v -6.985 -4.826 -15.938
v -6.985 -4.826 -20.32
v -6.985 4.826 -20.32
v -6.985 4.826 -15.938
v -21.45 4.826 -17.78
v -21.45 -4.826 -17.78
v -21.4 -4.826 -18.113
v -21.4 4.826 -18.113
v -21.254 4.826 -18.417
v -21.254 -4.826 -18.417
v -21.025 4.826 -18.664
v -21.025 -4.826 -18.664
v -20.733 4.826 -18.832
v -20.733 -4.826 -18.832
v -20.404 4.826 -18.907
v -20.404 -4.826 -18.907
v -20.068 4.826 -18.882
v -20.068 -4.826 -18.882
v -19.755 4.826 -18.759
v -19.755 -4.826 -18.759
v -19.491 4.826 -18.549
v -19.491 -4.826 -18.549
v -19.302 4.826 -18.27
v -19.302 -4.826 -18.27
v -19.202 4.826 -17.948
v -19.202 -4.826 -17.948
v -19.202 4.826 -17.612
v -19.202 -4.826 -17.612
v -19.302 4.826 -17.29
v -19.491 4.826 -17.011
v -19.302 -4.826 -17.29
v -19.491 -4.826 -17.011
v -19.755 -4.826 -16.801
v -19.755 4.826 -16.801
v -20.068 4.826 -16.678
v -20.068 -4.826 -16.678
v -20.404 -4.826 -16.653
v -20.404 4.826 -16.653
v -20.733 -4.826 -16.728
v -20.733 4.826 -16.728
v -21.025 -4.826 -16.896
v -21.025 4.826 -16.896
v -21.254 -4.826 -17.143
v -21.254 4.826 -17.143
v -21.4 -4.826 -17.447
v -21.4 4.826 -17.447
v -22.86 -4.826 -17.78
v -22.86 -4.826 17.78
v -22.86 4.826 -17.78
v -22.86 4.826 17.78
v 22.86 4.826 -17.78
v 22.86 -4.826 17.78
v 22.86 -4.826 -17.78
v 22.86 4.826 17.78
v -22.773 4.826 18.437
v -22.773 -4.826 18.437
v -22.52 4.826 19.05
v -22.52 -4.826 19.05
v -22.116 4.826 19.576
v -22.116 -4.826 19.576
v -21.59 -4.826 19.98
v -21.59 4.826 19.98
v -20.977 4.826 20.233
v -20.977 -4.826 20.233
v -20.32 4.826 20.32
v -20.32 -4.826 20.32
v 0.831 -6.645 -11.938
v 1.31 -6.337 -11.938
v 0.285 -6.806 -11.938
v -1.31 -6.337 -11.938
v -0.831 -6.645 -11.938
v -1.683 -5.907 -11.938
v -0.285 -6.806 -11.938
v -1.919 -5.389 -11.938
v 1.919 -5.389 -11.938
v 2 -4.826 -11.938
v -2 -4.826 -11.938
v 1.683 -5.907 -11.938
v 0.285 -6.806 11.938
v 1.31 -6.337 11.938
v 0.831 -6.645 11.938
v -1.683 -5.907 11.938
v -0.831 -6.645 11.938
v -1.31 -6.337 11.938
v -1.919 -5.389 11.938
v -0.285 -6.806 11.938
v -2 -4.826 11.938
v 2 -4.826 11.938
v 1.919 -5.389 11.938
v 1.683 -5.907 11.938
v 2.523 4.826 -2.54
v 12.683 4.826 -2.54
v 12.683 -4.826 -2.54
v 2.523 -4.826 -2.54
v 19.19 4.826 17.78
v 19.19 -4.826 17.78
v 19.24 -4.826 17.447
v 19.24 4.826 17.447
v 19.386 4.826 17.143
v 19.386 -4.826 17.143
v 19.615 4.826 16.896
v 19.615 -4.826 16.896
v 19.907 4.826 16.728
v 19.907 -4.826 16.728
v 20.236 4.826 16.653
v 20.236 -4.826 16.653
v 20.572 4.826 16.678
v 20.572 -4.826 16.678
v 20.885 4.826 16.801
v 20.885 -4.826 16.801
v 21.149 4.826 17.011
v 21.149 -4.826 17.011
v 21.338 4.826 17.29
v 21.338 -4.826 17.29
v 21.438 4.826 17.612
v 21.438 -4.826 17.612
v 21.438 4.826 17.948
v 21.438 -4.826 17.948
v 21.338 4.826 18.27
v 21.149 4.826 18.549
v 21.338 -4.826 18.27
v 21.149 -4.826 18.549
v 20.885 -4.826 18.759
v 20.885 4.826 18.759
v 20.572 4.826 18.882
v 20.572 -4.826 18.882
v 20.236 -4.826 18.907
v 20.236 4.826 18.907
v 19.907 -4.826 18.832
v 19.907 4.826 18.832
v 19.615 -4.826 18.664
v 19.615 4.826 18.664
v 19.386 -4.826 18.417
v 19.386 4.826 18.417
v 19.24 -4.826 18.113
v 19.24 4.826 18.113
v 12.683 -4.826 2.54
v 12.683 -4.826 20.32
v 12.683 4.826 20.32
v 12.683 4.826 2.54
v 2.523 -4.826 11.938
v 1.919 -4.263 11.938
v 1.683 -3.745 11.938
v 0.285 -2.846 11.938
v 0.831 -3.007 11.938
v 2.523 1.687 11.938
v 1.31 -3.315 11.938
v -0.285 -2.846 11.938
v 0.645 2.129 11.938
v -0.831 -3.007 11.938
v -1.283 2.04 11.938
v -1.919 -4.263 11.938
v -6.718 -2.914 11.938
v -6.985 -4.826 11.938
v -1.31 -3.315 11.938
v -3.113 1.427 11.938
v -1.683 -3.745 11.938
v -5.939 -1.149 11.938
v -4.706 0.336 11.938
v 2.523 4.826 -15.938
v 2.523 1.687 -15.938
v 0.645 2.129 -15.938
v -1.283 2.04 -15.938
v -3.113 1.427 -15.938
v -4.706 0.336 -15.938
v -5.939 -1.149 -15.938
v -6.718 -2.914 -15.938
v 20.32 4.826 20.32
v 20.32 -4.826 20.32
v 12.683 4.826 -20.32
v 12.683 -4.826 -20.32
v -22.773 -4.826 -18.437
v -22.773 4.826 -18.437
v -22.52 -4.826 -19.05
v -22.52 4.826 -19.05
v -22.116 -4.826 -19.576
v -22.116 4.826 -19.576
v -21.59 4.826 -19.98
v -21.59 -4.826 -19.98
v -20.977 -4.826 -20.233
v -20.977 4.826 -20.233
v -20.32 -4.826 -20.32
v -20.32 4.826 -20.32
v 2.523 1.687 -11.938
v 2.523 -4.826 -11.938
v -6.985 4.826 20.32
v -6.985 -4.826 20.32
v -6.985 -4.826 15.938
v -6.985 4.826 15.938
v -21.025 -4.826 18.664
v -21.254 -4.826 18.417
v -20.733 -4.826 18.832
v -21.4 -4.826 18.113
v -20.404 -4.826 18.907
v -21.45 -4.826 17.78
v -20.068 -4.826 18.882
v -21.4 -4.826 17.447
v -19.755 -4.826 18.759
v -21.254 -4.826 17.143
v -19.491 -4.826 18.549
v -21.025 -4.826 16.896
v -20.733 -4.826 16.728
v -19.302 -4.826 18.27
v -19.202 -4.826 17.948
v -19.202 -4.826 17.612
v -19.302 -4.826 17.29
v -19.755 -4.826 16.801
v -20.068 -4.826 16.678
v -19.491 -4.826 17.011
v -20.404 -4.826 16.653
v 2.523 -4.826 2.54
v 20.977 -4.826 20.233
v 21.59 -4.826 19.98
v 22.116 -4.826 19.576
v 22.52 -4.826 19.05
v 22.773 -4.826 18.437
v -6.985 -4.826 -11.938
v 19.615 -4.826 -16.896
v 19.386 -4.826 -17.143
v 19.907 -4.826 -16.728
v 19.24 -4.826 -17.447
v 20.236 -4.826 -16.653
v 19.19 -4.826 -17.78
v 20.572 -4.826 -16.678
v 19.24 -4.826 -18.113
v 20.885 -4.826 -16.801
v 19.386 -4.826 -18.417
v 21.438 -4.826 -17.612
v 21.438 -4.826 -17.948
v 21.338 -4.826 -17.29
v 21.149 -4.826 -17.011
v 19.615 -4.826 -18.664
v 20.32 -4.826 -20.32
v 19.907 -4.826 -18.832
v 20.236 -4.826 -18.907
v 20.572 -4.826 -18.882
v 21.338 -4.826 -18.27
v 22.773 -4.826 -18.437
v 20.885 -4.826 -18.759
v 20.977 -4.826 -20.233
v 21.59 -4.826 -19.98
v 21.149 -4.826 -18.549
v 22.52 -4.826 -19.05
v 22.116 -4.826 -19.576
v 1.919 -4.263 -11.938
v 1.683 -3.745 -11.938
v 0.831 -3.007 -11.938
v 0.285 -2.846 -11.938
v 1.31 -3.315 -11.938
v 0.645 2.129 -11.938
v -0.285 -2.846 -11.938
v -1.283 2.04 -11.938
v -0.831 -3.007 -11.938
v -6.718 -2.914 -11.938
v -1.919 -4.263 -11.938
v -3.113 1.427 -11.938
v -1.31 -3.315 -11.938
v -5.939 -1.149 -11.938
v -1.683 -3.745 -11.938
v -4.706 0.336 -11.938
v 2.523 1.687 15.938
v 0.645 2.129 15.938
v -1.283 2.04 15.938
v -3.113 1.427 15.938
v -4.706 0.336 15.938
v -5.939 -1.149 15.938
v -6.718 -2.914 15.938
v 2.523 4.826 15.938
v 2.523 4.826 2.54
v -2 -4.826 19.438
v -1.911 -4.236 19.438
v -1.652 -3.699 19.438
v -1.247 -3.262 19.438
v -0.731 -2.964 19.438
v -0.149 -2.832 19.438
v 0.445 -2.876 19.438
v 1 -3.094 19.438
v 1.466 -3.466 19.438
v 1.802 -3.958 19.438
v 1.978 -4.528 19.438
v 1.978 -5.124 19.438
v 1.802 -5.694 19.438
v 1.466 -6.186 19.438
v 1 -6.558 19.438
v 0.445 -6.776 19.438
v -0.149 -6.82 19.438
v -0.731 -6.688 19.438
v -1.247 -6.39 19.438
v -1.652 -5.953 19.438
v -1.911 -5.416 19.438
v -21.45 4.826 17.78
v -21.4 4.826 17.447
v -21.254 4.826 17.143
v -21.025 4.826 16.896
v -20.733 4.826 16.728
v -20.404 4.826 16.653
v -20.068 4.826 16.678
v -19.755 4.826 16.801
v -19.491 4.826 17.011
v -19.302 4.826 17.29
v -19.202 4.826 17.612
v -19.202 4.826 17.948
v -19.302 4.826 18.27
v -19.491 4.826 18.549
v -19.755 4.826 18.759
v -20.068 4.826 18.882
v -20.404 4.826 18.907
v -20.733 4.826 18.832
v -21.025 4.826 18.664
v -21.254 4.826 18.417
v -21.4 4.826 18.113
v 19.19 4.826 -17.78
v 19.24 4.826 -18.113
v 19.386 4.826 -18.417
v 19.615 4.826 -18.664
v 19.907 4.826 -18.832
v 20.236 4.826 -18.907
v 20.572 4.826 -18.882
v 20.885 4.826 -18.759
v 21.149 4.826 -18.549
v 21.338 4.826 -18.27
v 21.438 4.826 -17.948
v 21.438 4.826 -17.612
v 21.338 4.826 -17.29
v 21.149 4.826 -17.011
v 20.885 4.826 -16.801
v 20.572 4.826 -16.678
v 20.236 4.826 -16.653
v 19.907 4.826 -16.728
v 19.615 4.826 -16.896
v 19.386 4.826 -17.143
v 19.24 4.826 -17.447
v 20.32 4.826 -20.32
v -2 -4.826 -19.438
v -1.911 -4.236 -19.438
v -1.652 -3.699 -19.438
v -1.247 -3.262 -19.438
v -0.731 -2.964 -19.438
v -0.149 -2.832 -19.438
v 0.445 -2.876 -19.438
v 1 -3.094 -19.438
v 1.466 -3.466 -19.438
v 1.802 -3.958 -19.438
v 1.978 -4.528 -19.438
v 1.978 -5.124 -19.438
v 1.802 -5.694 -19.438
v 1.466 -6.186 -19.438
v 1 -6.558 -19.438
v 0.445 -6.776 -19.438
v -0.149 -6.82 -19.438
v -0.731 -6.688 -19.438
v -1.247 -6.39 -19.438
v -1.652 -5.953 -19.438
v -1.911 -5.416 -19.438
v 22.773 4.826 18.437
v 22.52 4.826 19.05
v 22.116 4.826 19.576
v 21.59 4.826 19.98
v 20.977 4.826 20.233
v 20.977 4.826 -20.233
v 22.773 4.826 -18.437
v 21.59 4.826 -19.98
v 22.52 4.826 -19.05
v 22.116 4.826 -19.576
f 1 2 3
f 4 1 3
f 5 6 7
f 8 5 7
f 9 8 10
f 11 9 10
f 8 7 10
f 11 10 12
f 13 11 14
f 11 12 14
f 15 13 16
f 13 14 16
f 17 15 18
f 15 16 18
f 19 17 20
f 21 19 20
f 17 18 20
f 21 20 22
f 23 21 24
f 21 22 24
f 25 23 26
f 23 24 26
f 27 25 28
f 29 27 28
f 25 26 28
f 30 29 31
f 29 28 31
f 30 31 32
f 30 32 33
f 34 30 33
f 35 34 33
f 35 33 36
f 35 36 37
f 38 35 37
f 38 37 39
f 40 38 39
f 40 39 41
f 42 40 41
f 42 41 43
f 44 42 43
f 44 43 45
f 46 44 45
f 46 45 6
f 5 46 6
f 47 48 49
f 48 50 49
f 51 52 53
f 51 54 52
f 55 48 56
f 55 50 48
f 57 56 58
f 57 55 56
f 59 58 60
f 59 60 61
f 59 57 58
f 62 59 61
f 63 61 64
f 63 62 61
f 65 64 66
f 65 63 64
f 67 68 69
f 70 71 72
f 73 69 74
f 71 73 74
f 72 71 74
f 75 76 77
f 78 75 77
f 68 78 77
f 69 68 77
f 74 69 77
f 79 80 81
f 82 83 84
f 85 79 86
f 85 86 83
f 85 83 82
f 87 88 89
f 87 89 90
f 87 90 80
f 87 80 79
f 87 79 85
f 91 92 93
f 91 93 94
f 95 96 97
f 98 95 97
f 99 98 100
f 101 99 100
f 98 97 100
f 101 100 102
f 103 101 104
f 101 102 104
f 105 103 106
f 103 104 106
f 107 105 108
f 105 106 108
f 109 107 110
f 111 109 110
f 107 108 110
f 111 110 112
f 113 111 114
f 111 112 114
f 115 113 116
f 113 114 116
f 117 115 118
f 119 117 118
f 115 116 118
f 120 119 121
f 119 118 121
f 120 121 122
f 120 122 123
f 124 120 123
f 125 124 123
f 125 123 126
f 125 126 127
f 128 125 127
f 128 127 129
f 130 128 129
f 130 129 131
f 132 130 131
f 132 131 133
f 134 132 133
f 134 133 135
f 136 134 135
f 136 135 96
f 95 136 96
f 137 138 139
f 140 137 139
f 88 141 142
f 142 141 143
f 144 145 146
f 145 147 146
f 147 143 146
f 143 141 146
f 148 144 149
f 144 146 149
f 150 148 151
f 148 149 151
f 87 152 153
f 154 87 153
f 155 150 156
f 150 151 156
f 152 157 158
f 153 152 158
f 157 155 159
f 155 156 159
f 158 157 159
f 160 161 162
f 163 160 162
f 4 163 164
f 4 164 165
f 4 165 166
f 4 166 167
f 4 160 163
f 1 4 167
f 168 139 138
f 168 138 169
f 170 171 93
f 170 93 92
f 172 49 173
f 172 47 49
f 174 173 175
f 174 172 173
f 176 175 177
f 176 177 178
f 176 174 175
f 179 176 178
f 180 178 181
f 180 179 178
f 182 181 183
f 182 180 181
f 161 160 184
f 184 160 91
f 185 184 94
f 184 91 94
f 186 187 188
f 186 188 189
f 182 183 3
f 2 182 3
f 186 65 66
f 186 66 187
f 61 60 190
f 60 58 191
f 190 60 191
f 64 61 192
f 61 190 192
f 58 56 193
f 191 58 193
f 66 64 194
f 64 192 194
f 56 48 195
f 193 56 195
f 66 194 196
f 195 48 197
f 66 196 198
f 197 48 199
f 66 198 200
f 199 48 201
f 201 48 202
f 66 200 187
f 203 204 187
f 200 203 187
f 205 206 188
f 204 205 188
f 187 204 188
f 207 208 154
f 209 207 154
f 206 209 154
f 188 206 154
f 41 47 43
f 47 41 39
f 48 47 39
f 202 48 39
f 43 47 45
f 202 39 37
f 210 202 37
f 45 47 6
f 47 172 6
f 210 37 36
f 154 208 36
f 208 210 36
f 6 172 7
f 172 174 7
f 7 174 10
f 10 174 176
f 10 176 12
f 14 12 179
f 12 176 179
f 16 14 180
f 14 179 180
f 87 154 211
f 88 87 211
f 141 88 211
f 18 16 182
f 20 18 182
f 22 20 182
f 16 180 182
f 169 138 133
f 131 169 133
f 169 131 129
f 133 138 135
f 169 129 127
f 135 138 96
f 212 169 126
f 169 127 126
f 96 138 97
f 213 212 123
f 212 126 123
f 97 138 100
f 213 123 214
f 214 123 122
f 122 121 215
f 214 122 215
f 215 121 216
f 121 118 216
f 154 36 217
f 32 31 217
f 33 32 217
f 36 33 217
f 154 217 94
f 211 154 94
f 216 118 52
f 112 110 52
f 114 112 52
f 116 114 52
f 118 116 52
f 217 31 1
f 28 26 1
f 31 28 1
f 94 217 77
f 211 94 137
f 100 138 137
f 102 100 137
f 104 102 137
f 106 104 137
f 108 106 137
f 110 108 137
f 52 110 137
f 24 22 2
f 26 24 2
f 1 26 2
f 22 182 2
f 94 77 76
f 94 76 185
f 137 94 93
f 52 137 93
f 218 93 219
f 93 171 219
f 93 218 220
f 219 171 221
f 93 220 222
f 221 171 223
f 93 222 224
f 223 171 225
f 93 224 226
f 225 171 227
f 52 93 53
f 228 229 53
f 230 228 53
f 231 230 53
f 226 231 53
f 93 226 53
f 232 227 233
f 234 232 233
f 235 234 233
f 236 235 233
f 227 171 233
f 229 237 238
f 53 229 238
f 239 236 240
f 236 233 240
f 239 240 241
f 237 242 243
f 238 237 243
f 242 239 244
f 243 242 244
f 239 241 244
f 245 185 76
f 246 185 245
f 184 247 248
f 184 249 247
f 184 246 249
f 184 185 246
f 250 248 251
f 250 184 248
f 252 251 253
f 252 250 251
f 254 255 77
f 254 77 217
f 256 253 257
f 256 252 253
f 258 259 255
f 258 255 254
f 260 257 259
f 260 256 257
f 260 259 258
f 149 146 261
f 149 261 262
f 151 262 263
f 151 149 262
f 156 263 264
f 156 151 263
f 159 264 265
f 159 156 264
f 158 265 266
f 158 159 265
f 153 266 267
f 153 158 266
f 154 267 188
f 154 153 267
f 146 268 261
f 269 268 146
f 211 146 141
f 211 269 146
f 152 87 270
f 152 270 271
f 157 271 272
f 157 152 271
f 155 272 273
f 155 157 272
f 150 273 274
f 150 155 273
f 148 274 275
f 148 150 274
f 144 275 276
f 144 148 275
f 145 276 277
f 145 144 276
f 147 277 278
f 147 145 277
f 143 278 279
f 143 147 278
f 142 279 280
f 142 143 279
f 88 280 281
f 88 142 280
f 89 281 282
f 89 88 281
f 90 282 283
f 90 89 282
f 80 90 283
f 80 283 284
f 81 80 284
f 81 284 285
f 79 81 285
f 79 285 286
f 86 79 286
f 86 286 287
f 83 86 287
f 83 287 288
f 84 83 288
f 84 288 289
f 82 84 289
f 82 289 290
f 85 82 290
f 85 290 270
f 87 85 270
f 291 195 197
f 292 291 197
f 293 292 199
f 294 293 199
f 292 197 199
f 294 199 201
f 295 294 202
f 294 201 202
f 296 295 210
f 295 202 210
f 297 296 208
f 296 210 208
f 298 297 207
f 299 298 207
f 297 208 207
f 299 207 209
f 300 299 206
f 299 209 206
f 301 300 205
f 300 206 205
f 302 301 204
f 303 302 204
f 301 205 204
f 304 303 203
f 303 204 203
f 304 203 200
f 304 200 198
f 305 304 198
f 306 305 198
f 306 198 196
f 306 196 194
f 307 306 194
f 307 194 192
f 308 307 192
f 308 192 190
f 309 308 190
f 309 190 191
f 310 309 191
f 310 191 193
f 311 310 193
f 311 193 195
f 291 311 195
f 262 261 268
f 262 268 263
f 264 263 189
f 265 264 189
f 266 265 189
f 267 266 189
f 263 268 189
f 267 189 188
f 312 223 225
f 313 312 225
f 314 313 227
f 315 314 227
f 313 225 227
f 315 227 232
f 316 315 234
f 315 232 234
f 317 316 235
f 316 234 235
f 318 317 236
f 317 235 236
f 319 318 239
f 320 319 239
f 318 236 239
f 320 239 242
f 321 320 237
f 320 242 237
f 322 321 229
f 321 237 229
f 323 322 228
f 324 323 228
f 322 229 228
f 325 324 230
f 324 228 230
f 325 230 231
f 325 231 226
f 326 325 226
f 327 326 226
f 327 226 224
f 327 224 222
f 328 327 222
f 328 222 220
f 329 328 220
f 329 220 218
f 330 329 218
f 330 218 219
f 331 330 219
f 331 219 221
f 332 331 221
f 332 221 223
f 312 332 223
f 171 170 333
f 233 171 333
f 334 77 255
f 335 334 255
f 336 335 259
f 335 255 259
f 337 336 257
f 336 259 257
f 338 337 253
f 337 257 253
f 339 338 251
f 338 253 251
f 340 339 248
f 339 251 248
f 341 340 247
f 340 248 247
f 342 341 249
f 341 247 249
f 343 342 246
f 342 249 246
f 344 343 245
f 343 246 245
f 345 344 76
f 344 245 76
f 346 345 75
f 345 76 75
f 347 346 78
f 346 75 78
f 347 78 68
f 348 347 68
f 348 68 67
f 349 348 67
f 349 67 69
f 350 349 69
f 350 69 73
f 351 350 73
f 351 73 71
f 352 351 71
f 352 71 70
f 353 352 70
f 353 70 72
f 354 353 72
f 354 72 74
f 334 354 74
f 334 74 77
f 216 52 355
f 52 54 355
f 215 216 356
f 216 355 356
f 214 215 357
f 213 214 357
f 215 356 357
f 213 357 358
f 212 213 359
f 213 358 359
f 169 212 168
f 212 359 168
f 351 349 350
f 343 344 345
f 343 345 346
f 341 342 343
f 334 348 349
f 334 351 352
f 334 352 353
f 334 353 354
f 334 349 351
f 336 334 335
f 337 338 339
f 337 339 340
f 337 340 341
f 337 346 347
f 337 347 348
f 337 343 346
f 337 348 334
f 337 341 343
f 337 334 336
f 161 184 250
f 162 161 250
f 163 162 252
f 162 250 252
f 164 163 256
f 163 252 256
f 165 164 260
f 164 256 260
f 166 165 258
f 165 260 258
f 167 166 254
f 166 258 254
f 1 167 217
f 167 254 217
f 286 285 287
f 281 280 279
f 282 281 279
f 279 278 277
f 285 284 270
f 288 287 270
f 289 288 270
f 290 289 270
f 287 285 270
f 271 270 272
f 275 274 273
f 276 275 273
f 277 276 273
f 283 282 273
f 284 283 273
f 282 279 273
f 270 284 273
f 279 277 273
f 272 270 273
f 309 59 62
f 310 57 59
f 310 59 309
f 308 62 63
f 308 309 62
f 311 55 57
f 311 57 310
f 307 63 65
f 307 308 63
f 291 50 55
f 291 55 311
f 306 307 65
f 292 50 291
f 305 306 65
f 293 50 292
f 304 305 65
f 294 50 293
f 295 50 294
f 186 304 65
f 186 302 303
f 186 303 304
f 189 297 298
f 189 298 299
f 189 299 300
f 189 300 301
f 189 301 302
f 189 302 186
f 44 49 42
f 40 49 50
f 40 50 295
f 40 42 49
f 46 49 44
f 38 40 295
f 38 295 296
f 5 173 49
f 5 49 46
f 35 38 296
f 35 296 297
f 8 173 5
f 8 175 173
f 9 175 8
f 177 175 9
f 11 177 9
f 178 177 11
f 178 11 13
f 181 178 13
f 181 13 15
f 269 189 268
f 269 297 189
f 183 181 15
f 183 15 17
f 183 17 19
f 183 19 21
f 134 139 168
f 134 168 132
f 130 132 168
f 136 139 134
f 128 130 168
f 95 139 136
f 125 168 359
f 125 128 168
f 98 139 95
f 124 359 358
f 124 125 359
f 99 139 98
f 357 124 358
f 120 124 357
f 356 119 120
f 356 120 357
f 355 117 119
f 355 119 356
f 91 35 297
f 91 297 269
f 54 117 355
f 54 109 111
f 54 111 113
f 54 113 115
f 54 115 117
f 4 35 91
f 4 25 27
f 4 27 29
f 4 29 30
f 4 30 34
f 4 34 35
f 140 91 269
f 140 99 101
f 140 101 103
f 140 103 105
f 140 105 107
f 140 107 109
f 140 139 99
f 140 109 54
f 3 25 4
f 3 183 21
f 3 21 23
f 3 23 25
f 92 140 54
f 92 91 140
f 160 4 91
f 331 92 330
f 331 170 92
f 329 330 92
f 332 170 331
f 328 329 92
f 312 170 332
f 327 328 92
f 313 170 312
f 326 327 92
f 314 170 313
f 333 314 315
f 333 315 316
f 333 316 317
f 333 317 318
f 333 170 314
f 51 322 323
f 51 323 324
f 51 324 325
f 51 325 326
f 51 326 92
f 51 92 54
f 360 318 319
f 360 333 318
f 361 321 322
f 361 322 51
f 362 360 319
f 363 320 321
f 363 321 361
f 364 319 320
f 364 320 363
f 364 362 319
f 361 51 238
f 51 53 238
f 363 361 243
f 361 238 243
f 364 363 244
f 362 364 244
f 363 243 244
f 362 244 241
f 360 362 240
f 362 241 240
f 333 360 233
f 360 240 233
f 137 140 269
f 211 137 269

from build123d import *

# Parameters (mm, degrees)
SKETCH1_W             = 45.72
SKETCH1_H             = 40.64
BODY_DEPTH            = 4.826
CORNER_FILLET_R       = 2.54
F_4_40_TAPPED_HOLE1_D = 2.2606
SKETCH4_W             = 13.97
SKETCH4_H             = 9.652
WHEEL_CUTOUT_DEPTH    = 8.382
SKETCH5_R             = 2
WHEEL_SHAFT_DEPTH     = 7.5
SKETCH9_W             = 10.16
SKETCH9_H             = 9.652
CUT_EXTRUDE2_DEPTH    = 17.78
BOSS_EXTRUDE2_DEPTH   = 4


with BuildPart() as part:
    # Sketch1 → Body (new body, symmetric)
    with BuildSketch(Plane(origin=(0, 0, 0), x_dir=(1, 0, 0), z_dir=(0, 1, 0))):
        Rectangle(SKETCH1_W, SKETCH1_H)
    extrude(amount=BODY_DEPTH, both=True)

    # Corner Fillet
    corner_fillet_edges = [part.edges().sort_by_distance(p)[0] for p in [
        (22.86, 0, 20.32),
        (-22.86, 0, 20.32),
        (-22.86, 0, -20.32),
        (22.86, 0, -20.32),
    ]]
    fillet(corner_fillet_edges, radius=CORNER_FILLET_R)

    # #4-40 Tapped Hole1 (through all)
    with Locations(Plane(origin=(0, 4.826, 0), x_dir=(1, 0, 0), z_dir=(0, 1, 0))):
        with Locations((20.32, 17.78), (-20.32, -17.78), (-20.32, 17.78), (20.32, -17.78)):
            Hole(F_4_40_TAPPED_HOLE1_D / 2)

    # Sketch4 → Wheel Cutout (cut)
    with BuildSketch(Plane(origin=(0, 0, -20.32), x_dir=(-1, 0, 0), z_dir=(0, 0, -1))):
        Rectangle(SKETCH4_W, SKETCH4_H)
    wheel_cutout = extrude(amount=-WHEEL_CUTOUT_DEPTH, mode=Mode.SUBTRACT)

    # Sketch5 → Wheel Shaft (add)
    with BuildSketch(Plane(origin=(0, 0, -11.938), x_dir=(-1, 0, 0), z_dir=(0, 0, -1))):
        with Locations((0, -4.826)):
            Circle(SKETCH5_R)
    wheel_shaft = extrude(amount=WHEEL_SHAFT_DEPTH)

    # Sketch9 → Cut-Extrude2 (cut)
    with BuildSketch(Plane(origin=(0, 0, -20.32), x_dir=(-1, 0, 0), z_dir=(0, 0, -1))):
        with Locations((-7.603288762, 0)):
            Rectangle(SKETCH9_W, SKETCH9_H)
    cut_extrude2 = extrude(amount=-CUT_EXTRUDE2_DEPTH, mode=Mode.SUBTRACT)

    # Sketch10 → Boss-Extrude2 (add)
    with BuildSketch(Plane(origin=(0, 0, -11.938), x_dir=(-1, 0, 0), z_dir=(0, 0, -1))):
        with BuildLine():
            Line((6.985, 4.826), (-2.523288762, 4.826))
            Line((-2.523288762, 4.826), (-2.523288762, 1.687312431))
            ThreePointArc((-2.523288762, 1.687312431), (3.947470899, 0.936612125), (6.985, -4.826))
            Line((6.985, -4.826), (6.985, 4.826))
        make_face()
    boss_extrude2 = extrude(amount=BOSS_EXTRUDE2_DEPTH)

    # Mirror3: Wheel Cutout, Wheel Shaft, Cut-Extrude2, Boss-Extrude2 across plane
    add(wheel_cutout.mirror(Plane.XY), mode=Mode.SUBTRACT)
    add(wheel_shaft.mirror(Plane.XY))
    add(cut_extrude2.mirror(Plane.XY), mode=Mode.SUBTRACT)
    add(boss_extrude2.mirror(Plane.XY))


solid = part.part
